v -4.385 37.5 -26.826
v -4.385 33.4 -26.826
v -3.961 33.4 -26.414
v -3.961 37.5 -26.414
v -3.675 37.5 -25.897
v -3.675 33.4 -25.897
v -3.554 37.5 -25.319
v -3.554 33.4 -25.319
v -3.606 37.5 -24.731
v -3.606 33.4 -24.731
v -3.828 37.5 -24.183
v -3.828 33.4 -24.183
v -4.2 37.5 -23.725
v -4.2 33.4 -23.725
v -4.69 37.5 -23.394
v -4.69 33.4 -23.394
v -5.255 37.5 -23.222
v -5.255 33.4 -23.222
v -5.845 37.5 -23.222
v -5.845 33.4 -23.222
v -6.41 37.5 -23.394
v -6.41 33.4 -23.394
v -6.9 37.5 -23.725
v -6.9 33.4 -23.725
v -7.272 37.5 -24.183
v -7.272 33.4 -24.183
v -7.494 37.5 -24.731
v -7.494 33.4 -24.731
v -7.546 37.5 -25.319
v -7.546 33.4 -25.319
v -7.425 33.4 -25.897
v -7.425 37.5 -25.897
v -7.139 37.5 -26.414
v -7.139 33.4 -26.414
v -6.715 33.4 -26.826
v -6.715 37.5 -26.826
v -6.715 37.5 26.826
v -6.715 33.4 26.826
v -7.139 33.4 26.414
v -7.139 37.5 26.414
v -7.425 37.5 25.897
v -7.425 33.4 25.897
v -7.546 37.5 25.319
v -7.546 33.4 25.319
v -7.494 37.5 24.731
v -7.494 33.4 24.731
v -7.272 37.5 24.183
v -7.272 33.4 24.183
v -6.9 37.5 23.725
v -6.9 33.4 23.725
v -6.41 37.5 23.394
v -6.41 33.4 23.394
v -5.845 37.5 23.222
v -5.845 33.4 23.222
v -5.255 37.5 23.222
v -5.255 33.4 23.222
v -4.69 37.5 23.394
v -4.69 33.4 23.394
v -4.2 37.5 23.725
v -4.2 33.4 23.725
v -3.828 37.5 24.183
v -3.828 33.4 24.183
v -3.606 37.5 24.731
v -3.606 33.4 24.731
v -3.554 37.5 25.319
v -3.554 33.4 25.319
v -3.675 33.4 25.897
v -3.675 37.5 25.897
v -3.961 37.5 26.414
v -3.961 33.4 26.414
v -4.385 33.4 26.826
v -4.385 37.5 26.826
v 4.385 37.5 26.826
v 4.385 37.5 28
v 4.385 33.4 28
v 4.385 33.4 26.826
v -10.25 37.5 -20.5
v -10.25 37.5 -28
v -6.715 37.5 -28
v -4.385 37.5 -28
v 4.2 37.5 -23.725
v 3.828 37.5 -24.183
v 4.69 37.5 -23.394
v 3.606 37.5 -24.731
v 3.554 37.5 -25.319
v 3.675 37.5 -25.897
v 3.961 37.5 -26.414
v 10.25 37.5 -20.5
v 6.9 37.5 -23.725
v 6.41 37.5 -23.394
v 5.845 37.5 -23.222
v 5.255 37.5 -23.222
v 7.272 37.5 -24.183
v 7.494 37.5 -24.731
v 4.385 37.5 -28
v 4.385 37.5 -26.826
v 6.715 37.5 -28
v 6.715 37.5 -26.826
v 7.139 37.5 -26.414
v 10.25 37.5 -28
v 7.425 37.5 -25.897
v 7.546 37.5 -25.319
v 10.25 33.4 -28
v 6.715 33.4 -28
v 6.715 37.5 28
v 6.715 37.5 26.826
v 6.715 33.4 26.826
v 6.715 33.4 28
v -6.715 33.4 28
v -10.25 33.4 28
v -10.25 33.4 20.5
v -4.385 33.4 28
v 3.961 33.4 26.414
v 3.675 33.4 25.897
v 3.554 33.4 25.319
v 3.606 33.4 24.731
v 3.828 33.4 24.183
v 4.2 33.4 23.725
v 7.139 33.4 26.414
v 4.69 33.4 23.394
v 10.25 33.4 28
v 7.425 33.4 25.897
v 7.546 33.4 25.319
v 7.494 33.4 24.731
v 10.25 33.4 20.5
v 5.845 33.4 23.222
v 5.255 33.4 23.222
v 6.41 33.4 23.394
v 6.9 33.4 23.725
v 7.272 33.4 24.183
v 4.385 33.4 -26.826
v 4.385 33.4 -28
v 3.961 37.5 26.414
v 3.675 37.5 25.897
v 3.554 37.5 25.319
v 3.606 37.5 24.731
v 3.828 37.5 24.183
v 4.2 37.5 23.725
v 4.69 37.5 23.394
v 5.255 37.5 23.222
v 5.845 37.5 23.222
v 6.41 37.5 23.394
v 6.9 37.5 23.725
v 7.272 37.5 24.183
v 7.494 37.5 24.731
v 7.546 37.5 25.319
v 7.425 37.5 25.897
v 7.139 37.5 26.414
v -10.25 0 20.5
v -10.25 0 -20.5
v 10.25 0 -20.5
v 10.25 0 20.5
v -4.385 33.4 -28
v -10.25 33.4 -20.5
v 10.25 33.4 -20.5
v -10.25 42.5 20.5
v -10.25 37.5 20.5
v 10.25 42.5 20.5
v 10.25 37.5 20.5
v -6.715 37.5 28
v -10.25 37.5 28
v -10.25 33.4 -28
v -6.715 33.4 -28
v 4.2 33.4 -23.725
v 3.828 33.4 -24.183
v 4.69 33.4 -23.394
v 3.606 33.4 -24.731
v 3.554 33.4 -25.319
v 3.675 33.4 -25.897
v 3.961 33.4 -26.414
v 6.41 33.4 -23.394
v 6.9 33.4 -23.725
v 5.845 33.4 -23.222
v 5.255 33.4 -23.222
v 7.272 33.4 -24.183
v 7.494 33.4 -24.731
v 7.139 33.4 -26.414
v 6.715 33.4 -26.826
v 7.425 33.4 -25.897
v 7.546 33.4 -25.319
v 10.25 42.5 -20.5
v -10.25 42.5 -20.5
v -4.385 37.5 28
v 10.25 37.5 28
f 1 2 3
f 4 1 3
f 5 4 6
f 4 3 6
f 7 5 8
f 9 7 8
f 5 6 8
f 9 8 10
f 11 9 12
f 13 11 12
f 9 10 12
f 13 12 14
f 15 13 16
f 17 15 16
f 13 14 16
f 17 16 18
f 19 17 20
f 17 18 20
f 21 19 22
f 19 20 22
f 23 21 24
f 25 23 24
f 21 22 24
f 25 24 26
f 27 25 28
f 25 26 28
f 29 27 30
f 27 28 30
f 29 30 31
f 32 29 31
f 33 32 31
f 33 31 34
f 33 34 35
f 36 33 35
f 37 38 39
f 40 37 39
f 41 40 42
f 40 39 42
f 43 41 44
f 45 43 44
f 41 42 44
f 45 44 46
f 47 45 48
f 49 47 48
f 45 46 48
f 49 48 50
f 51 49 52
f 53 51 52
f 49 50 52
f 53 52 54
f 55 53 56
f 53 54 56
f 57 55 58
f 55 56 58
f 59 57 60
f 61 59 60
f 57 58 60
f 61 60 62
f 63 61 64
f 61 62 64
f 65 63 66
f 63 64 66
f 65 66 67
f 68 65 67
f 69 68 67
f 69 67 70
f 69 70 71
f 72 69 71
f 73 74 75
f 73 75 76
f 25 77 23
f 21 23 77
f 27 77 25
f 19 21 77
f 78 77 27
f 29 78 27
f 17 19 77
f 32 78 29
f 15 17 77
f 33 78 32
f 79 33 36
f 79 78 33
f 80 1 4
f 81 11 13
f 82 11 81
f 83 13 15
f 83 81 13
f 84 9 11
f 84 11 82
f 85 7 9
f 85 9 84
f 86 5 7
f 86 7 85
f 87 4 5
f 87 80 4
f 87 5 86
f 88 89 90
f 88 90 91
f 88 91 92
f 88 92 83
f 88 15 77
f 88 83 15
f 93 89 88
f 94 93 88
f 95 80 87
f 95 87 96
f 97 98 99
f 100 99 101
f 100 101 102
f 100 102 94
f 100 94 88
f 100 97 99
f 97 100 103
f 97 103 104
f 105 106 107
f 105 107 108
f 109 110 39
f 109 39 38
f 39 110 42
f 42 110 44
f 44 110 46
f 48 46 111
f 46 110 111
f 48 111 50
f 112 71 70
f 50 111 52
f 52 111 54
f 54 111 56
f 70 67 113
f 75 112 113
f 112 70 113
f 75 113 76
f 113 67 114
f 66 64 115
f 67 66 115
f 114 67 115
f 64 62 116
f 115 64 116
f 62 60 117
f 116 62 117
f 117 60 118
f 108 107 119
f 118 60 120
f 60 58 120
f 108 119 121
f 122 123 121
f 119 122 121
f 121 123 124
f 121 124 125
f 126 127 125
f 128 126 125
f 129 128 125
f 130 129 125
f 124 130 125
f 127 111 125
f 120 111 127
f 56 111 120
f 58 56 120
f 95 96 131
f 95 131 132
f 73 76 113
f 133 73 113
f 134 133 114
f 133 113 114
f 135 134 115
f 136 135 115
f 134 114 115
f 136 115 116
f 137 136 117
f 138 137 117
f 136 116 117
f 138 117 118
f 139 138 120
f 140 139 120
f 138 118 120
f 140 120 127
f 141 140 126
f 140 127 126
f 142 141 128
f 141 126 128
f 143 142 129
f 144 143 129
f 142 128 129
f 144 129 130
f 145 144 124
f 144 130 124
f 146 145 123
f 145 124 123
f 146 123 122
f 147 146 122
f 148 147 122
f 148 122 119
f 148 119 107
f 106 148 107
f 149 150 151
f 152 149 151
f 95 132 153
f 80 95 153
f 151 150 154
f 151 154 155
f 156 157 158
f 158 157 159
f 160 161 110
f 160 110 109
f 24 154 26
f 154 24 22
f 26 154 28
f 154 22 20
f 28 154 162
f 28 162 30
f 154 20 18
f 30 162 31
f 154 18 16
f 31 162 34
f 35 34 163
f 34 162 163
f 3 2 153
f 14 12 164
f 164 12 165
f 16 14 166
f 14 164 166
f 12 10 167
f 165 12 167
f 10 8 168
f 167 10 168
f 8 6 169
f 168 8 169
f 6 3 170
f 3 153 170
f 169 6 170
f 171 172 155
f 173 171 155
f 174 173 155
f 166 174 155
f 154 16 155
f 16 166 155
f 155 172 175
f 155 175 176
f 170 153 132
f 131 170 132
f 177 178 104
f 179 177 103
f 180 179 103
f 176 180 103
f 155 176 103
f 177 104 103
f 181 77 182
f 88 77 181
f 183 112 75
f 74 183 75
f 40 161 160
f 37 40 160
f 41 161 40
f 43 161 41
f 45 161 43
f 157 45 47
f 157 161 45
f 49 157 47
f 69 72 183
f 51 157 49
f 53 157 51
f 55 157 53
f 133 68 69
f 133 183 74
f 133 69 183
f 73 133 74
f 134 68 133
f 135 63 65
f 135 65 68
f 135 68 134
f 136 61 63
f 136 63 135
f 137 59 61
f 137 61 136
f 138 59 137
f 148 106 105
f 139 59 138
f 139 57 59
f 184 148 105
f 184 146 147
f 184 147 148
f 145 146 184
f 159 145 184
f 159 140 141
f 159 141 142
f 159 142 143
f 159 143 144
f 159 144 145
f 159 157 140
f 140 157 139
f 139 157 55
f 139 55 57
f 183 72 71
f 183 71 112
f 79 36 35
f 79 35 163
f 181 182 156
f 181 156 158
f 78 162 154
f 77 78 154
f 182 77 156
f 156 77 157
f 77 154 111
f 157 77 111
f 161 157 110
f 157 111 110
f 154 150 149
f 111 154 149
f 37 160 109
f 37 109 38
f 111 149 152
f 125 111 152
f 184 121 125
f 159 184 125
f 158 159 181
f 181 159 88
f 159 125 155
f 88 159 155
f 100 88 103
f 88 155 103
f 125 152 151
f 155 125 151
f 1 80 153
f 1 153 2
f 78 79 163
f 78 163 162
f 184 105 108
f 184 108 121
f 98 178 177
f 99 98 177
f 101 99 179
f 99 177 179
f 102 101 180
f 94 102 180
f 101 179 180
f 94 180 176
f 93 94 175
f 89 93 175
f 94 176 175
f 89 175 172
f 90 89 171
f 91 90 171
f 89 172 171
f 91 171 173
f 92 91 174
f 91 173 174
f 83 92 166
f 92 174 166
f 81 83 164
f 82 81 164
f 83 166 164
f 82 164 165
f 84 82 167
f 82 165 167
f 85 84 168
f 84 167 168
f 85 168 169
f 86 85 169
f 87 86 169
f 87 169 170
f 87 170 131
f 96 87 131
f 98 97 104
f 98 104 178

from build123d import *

# Parameters (mm, degrees)
SKETCH2_W           = 20.5
SKETCH2_H           = 41
BOSS_EXTRUDE1_DEPTH = 42.5
BOSS_EXTRUDE2_START = 33.4
BOSS_EXTRUDE2_DEPTH = 4.1


with BuildPart() as part:
    # Sketch2 → Boss-Extrude1 (new body)
    with BuildSketch(Plane(origin=(0, 0, 0), x_dir=(1, 0, 0), z_dir=(0, 1, 0))):
        Rectangle(SKETCH2_W, SKETCH2_H)
    extrude(amount=BOSS_EXTRUDE1_DEPTH)

    # Sketch2<3> → Boss-Extrude2 (add)
    with BuildSketch(Plane(origin=(0, 0, 0), x_dir=(1, 0, 0), z_dir=(0, 1, 0)).offset(BOSS_EXTRUDE2_START)):
        with BuildLine():
            Line((-10.25, 28), (-10.25, 20.5))
            Line((-10.25, 20.5), (10.25, 20.5))
            Line((10.25, 20.5), (10.25, 28))
            Line((10.25, 28), (6.715, 28))
            Line((6.715, 28), (6.715, 26.825661404))
            ThreePointArc((6.715, 26.825661404), (5.55, 23.2), (4.385, 26.825661404))
            Line((4.385, 26.825661404), (4.385, 28))
            Line((4.385, 28), (-4.385, 28))
            Line((-4.385, 28), (-4.385, 26.825661404))
            ThreePointArc((-4.385, 26.825661404), (-5.55, 23.2), (-6.715, 26.825661404))
            Line((-6.715, 26.825661404), (-6.715, 28))
            Line((-6.715, 28), (-10.25, 28))
        make_face()
        with BuildLine():
            Line((10.25, -20.5), (-10.25, -20.5))
            Line((-10.25, -20.5), (-10.25, -28))
            Line((-10.25, -28), (-6.715, -28))
            Line((-6.715, -28), (-6.715, -26.825661404))
            ThreePointArc((-6.715, -26.825661404), (-5.55, -23.2), (-4.385, -26.825661404))
            Line((-4.385, -26.825661404), (-4.385, -28))
            Line((-4.385, -28), (4.385, -28))
            Line((4.385, -28), (4.385, -26.825661404))
            ThreePointArc((4.385, -26.825661404), (5.55, -23.2), (6.715, -26.825661404))
            Line((6.715, -26.825661404), (6.715, -28))
            Line((6.715, -28), (10.25, -28))
            Line((10.25, -28), (10.25, -20.5))
        make_face()
    extrude(amount=BOSS_EXTRUDE2_DEPTH)


solid = part.part
